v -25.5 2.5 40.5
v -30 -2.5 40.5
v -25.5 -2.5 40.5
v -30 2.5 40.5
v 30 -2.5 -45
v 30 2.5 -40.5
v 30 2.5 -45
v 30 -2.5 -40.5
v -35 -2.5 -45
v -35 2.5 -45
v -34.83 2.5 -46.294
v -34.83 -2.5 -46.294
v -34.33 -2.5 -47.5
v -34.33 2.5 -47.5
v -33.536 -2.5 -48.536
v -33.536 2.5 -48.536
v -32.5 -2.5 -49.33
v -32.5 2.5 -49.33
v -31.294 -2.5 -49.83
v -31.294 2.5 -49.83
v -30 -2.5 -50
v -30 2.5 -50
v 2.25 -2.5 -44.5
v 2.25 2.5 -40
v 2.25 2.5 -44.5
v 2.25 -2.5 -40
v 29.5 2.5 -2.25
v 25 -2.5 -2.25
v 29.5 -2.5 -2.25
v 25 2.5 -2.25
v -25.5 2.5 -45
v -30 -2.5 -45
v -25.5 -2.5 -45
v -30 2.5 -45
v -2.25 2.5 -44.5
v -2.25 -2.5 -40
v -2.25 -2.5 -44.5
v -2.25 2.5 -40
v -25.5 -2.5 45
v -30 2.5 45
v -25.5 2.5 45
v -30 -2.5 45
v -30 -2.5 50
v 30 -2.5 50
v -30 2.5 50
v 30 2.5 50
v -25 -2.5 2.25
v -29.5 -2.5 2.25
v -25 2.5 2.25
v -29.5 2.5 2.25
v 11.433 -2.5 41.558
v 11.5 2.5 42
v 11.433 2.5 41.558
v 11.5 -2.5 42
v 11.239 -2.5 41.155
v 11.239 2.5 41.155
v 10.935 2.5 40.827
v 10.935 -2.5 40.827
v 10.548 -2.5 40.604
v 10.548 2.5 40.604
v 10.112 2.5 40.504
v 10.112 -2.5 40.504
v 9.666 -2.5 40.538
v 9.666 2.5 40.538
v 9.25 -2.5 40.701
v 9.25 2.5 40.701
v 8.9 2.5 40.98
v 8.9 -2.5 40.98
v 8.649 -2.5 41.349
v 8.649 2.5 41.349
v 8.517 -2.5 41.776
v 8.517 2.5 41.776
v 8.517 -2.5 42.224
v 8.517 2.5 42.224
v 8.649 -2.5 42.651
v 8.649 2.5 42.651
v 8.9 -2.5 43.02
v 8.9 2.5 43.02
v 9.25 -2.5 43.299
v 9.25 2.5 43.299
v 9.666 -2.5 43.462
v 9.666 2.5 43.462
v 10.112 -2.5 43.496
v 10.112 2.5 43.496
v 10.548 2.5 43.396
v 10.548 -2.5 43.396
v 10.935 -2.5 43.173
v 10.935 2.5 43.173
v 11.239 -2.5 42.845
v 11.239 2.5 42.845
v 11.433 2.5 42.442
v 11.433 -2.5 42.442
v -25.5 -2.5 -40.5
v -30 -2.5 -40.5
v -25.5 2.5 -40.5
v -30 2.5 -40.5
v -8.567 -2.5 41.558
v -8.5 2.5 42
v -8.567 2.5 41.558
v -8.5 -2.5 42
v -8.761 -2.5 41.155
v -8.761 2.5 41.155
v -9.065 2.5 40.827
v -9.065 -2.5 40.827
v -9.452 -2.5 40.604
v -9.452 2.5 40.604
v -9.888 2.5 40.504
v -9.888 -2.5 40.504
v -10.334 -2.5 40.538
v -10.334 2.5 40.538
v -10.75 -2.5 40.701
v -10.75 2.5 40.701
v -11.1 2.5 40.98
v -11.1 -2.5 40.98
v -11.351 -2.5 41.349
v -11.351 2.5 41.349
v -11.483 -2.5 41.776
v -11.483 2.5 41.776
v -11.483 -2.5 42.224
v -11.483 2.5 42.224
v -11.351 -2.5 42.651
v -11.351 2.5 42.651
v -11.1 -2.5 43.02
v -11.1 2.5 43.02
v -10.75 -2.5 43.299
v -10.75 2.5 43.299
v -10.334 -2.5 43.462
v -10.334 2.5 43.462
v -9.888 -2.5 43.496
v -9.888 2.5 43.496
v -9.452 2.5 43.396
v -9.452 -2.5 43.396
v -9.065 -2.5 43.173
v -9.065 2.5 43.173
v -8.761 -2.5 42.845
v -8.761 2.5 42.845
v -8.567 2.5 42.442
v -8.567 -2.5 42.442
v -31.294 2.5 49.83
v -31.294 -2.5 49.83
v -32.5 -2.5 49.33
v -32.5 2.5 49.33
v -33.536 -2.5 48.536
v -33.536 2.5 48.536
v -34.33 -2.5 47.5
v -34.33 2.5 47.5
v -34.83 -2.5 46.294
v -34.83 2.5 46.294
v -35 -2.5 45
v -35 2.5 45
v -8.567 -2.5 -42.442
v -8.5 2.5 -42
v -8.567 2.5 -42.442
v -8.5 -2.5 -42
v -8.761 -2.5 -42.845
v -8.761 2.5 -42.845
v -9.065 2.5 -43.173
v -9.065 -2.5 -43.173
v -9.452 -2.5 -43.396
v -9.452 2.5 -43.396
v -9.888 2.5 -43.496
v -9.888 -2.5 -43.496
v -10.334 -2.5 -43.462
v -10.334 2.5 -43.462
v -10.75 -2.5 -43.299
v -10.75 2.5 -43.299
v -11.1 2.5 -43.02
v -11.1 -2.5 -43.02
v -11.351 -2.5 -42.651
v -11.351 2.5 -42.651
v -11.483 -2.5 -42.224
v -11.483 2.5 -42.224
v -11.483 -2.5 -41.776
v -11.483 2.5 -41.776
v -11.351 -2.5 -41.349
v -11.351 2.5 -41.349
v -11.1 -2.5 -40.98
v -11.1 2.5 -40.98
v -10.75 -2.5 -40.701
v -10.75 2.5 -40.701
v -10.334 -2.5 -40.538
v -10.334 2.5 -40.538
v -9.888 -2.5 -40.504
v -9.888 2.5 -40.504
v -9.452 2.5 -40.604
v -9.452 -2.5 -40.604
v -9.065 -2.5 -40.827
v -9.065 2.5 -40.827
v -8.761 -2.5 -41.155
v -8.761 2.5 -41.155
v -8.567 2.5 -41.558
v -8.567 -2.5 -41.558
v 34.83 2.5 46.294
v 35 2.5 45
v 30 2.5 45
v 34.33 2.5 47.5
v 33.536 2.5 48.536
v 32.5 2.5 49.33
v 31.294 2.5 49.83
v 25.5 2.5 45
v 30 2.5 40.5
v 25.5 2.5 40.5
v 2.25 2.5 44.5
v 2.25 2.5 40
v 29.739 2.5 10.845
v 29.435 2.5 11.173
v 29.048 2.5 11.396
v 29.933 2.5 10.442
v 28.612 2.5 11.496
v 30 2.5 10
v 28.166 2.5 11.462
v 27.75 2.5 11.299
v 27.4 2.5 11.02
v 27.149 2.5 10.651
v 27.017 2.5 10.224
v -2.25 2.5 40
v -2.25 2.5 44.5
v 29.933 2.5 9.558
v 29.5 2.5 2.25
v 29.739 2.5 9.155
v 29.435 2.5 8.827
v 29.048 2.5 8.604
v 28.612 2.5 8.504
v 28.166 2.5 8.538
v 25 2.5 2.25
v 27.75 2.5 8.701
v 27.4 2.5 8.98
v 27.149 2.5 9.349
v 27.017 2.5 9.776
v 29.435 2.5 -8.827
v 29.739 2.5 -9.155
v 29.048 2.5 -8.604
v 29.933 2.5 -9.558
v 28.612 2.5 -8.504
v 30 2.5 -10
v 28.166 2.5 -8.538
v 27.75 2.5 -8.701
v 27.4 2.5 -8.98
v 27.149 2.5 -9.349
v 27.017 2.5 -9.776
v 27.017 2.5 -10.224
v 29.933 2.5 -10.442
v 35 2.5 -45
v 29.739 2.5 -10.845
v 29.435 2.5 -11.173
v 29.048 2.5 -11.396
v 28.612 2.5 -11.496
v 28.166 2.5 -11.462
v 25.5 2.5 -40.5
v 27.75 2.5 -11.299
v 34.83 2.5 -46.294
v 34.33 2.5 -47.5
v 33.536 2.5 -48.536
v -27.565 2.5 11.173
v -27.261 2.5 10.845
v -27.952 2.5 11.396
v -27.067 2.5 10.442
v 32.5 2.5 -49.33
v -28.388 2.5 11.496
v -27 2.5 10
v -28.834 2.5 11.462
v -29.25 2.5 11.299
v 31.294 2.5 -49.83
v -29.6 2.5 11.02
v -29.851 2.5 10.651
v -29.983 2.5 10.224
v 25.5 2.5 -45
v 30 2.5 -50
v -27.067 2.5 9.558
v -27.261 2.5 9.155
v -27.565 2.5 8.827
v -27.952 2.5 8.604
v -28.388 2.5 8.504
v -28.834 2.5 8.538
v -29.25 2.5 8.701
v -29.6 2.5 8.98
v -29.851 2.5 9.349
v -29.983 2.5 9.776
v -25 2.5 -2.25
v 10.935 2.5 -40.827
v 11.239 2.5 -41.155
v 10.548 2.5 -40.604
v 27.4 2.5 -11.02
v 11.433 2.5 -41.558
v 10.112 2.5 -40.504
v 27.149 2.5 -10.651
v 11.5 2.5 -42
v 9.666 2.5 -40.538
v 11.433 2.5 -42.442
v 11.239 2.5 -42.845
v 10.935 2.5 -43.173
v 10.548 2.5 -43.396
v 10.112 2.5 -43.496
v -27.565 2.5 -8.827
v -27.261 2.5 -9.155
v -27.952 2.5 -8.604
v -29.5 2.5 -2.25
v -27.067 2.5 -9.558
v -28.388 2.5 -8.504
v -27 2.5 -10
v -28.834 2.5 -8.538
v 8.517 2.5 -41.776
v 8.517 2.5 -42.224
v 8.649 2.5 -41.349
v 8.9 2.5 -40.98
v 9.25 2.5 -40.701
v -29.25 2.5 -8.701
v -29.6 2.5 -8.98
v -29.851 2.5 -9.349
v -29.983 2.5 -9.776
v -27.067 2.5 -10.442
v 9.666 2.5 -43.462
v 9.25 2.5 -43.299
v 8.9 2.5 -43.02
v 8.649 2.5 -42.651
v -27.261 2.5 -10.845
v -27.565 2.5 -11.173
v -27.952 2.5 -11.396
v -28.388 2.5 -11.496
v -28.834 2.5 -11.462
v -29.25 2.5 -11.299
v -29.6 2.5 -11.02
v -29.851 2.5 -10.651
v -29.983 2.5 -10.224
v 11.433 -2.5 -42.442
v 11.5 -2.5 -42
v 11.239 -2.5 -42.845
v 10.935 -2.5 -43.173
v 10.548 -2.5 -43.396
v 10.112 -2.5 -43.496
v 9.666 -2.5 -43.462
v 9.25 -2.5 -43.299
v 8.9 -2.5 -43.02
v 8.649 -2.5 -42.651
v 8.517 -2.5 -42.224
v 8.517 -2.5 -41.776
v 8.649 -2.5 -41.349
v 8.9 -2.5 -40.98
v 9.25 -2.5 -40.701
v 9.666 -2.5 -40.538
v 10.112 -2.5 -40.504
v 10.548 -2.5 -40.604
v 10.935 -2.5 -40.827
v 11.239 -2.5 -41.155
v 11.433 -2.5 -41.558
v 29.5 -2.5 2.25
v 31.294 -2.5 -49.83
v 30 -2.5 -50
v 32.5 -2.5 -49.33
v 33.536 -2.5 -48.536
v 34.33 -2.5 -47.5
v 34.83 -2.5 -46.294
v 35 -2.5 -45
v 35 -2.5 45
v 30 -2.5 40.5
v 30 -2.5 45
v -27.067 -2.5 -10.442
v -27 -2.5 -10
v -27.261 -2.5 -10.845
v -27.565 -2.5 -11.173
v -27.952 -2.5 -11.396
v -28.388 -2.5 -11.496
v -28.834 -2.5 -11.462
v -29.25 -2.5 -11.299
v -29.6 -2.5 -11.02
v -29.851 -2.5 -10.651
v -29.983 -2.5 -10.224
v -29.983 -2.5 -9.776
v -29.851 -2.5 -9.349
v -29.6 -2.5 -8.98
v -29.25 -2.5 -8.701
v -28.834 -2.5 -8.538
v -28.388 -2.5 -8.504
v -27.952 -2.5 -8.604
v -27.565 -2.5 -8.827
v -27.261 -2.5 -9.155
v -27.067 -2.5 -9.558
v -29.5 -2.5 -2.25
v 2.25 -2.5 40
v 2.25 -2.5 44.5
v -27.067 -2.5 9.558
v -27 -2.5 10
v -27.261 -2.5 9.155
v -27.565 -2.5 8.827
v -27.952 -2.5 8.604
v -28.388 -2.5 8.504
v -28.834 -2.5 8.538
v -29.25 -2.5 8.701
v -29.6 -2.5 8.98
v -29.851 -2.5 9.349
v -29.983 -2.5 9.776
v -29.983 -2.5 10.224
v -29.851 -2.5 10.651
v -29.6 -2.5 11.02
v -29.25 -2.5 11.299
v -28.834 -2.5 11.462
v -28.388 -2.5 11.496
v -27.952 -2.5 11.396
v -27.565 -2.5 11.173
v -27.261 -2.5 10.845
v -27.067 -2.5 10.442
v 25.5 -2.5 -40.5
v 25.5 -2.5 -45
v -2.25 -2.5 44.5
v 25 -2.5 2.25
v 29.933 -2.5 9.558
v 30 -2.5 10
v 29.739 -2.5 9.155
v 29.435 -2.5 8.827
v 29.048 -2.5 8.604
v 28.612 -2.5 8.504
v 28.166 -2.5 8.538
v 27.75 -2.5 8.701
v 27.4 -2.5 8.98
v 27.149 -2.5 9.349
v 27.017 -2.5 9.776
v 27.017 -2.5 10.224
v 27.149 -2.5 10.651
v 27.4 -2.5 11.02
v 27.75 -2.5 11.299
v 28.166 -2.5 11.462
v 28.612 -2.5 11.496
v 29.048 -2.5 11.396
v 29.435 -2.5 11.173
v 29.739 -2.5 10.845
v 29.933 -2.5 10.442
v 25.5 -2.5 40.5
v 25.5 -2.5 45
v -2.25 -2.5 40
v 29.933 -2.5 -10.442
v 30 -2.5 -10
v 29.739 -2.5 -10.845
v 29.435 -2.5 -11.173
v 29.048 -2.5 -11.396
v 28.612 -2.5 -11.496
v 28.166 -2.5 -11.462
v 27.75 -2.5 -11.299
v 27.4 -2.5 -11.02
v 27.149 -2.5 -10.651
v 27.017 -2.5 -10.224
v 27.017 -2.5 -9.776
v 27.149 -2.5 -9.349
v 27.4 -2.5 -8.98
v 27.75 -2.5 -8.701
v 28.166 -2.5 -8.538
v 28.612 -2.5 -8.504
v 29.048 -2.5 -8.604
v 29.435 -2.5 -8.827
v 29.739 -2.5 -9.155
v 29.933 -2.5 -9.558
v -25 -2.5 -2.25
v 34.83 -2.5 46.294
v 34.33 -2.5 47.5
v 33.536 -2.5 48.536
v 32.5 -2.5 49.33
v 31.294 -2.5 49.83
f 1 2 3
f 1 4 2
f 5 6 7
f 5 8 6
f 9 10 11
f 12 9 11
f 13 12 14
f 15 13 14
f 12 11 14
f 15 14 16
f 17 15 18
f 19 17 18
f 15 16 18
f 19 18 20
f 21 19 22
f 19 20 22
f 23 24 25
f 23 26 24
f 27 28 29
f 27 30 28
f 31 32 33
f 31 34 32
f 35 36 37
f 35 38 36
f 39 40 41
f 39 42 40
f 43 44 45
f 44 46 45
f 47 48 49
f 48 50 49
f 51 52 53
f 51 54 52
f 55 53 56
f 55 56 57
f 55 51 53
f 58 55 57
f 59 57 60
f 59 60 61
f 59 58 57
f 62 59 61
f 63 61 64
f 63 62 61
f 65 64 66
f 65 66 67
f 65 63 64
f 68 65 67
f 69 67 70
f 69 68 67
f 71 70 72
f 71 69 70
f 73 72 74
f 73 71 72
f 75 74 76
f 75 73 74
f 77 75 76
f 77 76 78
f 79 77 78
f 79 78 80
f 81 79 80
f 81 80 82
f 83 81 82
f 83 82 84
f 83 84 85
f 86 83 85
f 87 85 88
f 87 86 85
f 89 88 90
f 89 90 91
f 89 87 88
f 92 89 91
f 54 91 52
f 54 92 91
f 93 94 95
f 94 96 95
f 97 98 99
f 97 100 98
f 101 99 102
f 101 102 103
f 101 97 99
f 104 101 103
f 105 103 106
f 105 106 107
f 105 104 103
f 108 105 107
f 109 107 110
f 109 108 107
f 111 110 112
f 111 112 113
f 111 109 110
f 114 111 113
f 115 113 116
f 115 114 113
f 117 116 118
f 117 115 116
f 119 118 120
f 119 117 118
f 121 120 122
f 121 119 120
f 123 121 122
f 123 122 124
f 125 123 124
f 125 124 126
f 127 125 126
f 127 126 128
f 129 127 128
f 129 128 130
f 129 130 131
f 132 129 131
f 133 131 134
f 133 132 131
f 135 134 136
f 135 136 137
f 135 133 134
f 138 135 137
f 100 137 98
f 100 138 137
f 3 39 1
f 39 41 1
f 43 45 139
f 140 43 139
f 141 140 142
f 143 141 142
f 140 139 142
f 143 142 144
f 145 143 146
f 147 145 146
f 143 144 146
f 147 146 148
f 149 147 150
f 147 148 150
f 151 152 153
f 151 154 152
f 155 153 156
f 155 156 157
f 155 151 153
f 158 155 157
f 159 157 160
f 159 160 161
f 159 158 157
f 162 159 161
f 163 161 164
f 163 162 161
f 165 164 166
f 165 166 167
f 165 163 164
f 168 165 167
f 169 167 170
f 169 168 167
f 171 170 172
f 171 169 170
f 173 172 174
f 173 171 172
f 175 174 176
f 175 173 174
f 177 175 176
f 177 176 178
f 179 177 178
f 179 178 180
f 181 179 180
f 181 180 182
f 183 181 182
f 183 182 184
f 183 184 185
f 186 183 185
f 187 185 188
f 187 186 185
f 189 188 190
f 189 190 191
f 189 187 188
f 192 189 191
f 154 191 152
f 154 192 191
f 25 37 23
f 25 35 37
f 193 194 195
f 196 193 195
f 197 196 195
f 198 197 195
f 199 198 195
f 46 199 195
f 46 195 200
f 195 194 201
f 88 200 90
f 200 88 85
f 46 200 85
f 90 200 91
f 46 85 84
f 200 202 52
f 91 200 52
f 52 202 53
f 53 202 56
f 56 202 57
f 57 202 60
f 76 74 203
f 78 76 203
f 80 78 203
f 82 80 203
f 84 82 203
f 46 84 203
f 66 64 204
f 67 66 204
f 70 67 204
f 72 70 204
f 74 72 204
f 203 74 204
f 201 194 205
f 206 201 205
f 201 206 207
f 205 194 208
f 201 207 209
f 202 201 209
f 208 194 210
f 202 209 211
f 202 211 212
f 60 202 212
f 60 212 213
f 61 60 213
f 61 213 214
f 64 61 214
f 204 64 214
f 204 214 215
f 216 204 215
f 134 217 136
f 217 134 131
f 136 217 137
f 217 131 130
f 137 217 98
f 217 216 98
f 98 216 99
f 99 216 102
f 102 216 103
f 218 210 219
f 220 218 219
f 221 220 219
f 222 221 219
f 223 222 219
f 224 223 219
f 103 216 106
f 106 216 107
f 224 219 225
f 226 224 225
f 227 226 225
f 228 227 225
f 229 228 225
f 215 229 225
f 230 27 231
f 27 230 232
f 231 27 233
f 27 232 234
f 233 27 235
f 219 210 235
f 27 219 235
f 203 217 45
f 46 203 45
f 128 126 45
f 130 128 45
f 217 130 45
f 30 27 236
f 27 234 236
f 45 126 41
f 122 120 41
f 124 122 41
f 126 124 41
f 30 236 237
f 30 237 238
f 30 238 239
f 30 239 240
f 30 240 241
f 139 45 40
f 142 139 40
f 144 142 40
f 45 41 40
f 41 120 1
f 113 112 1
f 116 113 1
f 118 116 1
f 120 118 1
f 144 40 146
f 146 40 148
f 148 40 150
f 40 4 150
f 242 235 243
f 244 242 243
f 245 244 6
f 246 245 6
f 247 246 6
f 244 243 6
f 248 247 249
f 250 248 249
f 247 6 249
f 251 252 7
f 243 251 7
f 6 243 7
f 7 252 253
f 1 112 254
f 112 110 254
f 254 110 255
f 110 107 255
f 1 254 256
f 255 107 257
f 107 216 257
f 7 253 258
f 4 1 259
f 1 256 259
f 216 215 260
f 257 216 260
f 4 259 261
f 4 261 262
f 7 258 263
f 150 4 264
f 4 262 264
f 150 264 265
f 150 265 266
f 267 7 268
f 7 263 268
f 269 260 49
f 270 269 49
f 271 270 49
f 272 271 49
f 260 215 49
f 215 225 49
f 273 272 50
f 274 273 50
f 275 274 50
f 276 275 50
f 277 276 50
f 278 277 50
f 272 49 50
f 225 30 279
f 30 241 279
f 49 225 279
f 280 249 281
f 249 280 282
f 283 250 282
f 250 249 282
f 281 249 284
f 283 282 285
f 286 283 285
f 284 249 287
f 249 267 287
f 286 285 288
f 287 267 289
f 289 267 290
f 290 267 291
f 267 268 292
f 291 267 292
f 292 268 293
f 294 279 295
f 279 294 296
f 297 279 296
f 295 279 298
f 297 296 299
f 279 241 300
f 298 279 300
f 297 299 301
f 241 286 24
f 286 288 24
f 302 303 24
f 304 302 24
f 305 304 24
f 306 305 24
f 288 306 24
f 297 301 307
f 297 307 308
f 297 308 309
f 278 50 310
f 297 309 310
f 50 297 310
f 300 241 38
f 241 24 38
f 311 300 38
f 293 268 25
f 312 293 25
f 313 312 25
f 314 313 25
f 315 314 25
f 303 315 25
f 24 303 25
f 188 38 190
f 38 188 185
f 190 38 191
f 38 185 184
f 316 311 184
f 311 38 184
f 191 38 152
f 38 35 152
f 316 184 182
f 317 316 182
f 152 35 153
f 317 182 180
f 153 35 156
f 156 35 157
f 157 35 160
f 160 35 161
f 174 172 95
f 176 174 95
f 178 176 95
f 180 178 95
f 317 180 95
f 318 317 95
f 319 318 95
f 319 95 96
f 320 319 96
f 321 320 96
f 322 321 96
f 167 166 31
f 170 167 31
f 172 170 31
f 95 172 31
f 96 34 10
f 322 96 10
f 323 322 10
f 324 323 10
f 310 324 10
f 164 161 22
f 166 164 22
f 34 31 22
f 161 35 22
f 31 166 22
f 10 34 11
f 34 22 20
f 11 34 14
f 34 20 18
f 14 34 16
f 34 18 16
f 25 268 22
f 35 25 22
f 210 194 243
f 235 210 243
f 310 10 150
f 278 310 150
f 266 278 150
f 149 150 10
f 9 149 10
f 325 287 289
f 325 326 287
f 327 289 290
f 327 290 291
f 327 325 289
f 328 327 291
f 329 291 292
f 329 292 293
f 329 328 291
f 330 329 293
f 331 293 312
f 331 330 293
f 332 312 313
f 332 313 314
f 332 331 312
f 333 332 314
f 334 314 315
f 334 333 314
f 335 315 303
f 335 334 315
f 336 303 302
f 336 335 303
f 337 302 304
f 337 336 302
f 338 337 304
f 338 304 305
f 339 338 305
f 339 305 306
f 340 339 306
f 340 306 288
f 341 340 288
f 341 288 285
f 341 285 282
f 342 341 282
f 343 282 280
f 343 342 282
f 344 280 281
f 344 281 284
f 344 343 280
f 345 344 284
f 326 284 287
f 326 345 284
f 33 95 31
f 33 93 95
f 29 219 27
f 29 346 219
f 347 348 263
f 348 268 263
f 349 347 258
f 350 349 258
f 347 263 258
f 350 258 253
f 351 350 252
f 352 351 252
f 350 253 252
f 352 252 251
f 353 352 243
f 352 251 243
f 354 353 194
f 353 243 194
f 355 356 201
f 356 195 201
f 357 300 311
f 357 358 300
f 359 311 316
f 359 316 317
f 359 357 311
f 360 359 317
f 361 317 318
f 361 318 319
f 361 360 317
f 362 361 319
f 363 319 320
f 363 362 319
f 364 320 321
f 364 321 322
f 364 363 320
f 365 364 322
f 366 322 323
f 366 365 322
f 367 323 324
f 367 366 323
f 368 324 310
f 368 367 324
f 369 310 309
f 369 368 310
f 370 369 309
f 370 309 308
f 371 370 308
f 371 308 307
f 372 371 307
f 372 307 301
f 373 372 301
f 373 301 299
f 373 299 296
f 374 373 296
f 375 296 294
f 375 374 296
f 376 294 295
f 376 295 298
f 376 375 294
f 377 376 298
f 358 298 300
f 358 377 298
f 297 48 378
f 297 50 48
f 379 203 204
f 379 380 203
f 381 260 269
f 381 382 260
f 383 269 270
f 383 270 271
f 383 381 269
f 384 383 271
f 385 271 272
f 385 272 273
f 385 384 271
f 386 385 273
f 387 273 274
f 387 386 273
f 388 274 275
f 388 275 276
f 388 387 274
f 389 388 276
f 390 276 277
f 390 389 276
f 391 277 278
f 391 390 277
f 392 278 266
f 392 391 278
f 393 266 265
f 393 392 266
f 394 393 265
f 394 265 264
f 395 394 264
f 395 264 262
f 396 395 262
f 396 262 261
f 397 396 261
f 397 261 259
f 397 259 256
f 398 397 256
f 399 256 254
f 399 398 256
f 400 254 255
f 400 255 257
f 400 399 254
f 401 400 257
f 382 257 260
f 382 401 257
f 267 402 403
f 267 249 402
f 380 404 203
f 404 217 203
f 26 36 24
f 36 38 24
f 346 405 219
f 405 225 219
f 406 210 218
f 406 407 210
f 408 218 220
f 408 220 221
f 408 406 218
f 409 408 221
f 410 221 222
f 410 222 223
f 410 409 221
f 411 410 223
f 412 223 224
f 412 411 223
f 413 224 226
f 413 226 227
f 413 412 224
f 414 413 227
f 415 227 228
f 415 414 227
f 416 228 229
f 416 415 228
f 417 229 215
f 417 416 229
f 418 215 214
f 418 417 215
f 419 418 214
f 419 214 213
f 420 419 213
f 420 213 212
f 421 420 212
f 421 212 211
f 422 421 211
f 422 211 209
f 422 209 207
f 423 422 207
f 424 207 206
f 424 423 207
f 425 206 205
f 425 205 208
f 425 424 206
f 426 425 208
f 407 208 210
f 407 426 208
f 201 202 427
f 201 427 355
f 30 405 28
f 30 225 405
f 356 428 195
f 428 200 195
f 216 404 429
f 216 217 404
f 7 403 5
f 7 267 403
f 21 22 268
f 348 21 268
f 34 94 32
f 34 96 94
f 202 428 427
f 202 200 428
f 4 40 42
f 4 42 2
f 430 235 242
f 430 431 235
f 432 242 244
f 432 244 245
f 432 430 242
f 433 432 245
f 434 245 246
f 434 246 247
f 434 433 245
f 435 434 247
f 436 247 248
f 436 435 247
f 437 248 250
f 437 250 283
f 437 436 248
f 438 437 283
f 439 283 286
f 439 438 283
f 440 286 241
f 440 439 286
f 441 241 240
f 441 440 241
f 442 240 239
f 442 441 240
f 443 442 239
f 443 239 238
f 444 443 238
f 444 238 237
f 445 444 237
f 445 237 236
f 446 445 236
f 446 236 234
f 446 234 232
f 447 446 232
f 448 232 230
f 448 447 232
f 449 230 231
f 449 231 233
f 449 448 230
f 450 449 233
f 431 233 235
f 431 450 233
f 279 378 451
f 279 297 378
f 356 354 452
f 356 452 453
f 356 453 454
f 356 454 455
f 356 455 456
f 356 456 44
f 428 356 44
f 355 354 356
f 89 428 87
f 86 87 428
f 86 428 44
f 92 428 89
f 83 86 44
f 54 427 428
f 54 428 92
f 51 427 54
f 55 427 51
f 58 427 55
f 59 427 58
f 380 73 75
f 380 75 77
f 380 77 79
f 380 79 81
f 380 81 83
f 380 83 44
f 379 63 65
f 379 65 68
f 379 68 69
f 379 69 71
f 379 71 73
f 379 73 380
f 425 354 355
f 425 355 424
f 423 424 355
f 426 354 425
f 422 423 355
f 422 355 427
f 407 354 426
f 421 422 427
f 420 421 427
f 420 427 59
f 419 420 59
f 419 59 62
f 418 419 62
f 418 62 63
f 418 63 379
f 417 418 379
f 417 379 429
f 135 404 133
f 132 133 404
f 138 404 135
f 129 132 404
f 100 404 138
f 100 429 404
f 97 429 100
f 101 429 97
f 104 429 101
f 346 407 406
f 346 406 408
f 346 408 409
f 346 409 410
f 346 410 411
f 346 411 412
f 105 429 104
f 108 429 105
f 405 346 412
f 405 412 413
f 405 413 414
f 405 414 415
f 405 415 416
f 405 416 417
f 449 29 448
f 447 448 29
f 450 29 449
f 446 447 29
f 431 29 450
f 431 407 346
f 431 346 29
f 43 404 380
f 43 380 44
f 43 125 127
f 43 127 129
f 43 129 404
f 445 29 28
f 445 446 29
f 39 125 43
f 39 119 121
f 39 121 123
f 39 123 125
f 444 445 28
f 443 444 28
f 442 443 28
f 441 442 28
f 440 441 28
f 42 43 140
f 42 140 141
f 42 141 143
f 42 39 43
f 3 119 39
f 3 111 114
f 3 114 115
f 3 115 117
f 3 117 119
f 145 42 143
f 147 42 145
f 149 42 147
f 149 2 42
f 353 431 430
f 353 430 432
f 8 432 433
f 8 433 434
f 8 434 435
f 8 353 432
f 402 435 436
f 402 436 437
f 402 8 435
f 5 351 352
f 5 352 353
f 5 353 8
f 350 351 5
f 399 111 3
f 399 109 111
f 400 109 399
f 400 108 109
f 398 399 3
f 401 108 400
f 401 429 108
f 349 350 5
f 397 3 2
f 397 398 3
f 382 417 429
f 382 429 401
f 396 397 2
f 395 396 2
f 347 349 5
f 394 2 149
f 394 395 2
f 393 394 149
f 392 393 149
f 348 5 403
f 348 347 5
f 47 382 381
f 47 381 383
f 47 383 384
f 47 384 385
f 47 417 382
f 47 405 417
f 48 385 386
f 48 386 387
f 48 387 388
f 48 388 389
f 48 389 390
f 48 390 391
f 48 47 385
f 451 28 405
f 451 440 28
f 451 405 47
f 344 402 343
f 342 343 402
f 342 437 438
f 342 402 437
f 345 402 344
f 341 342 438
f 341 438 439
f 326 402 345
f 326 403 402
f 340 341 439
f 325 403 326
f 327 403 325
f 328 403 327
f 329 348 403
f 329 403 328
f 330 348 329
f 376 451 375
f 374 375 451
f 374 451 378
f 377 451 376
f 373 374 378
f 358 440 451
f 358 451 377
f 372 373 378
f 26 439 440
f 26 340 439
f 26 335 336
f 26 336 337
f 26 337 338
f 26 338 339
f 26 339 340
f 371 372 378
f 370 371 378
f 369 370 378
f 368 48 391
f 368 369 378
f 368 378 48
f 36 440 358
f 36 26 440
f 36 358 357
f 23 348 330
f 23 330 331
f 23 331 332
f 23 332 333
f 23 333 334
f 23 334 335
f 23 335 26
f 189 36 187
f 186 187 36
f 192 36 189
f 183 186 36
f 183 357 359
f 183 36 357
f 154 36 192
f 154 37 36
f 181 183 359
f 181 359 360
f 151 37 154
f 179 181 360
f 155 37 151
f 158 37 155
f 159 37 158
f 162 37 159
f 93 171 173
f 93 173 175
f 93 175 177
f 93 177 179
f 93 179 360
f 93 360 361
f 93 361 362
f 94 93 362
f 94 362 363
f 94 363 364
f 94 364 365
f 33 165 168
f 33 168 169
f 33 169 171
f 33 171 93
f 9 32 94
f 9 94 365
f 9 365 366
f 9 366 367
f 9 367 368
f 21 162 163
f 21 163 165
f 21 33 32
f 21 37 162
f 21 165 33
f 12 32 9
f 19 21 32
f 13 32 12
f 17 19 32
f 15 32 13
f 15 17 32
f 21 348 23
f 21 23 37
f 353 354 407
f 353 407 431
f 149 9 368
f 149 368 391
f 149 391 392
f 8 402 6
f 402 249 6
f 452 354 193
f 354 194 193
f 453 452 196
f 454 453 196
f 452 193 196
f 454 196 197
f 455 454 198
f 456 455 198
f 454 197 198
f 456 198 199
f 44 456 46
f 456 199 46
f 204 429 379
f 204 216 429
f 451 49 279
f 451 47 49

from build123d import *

# Parameters (mm, degrees)
SKETCH1_R           = 1.5
SKETCH1_W           = 4.5
SKETCH1_H           = 4.5
BOSS_EXTRUDE1_DEPTH = 2.5


with BuildPart() as part:
    # Sketch1 → Boss-Extrude1 (new body, symmetric)
    with BuildSketch(Plane(origin=(0, 0, 0), x_dir=(1, 0, 0), z_dir=(0, 1, 0))):
        with BuildLine():
            Line((-30, 50), (30, 50))
            ThreePointArc((30, 50), (33.535533906, 48.535533906), (35, 45))
            Line((35, 45), (35, -45))
            ThreePointArc((35, -45), (33.535533906, -48.535533906), (30, -50))
            Line((30, -50), (-30, -50))
            ThreePointArc((-30, -50), (-33.535533906, -48.535533906), (-35, -45))
            Line((-35, -45), (-35, 45))
            ThreePointArc((-35, 45), (-33.535533906, 48.535533906), (-30, 50))
        make_face()
        with Locations((10, 42)):
            Circle(SKETCH1_R, mode=Mode.SUBTRACT)
        with Locations((10, -42)):
            Circle(SKETCH1_R, mode=Mode.SUBTRACT)
        with Locations((-10, -42)):
            Circle(SKETCH1_R, mode=Mode.SUBTRACT)
        with Locations((-10, 42)):
            Circle(SKETCH1_R, mode=Mode.SUBTRACT)
        with Locations((28.5, 10)):
            Circle(SKETCH1_R, mode=Mode.SUBTRACT)
        with Locations((28.5, -10)):
            Circle(SKETCH1_R, mode=Mode.SUBTRACT)
        with Locations((-28.5, -10)):
            Circle(SKETCH1_R, mode=Mode.SUBTRACT)
        with Locations((-28.5, 10)):
            Circle(SKETCH1_R, mode=Mode.SUBTRACT)
        with Locations((27.25, 0)):
            Rectangle(SKETCH1_W, SKETCH1_H, mode=Mode.SUBTRACT)
        with Locations((0, -42.25)):
            Rectangle(SKETCH1_W, SKETCH1_H, mode=Mode.SUBTRACT)
        with Locations((0, 42.25)):
            Rectangle(SKETCH1_W, SKETCH1_H, mode=Mode.SUBTRACT)
        with Locations((-27.25, 0)):
            Rectangle(SKETCH1_W, SKETCH1_H, mode=Mode.SUBTRACT)
        with Locations((27.75, -42.75)):
            Rectangle(SKETCH1_W, SKETCH1_H, mode=Mode.SUBTRACT)
        with Locations((27.75, 42.75)):
            Rectangle(SKETCH1_W, SKETCH1_H, mode=Mode.SUBTRACT)
        with Locations((-27.75, 42.75)):
            Rectangle(SKETCH1_W, SKETCH1_H, mode=Mode.SUBTRACT)
        with Locations((-27.75, -42.75)):
            Rectangle(SKETCH1_W, SKETCH1_H, mode=Mode.SUBTRACT)
    extrude(amount=BOSS_EXTRUDE1_DEPTH, both=True)


solid = part.part
